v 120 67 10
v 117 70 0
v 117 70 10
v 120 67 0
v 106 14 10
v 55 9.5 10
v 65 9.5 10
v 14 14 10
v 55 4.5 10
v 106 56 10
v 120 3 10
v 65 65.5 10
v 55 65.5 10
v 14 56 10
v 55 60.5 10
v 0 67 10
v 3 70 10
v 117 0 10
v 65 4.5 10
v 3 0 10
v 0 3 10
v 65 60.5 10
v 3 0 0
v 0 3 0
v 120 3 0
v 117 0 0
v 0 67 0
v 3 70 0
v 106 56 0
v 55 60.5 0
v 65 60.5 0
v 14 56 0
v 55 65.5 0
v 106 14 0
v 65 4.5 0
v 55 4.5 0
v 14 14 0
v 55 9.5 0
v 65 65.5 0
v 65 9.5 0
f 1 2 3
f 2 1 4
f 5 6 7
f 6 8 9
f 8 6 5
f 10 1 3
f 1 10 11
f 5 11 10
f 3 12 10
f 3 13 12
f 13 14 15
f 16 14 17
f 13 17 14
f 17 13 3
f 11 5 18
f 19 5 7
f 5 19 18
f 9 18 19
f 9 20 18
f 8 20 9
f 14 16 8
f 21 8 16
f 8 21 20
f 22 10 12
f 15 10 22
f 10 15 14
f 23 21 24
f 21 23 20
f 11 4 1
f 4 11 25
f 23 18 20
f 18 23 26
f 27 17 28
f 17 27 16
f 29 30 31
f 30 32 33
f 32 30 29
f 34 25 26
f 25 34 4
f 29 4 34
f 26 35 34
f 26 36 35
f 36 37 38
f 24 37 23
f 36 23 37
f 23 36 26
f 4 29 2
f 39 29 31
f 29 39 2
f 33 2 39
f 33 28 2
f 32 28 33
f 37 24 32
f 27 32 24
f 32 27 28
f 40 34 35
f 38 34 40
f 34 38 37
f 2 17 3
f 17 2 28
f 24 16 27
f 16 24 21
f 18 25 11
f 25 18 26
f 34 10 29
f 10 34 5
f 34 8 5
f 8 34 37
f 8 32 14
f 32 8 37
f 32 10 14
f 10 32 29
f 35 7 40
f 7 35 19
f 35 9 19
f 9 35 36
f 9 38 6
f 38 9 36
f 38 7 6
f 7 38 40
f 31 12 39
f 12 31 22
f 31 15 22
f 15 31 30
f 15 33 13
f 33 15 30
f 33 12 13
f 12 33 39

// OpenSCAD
$fn = 32;

// ----------------------------------------------------------------------
// Frame plate: 120 x 70 frame, 14 mm rails
// ----------------------------------------------------------------------

// --- parameters (mm) ---
plate_l = 120;            // plate length, X
plate_w = 70;             // plate width, Y
plate_t = 10;             // plate thickness, Z (extrusion height)
corner_c = 3;             // corner chamfer
frame_bar = 14;           // frame rail width
slot_l = 10;              // adjustment slot length
slot_w = 5;               // adjustment slot width

win_l = plate_l - 2 * frame_bar;  // window length
win_w = plate_w - 2 * frame_bar;  // window width

profile = [[3, 0], [117, 0], [120, 3], [120, 67], [117, 70], [3, 70], [0, 67], [0, 3]];  // primary outline, 8 points, counter clockwise
void_1 = [[14, 14], [106, 14], [106, 56], [14, 56]];  // the window, 4 points
void_2 = [[55, 4.5], [65, 4.5], [65, 9.5], [55, 9.5]];  // adjustment slot, 4 points
void_3 = [[55, 60.5], [65, 60.5], [65, 65.5], [55, 65.5]];  // adjustment slot, 4 points

// --- the one profile operation ---
difference() {
  linear_extrude(height = plate_t) polygon(points = profile);
  translate([0, 0, -1])
    linear_extrude(height = plate_t + 2) polygon(points = void_1);
  translate([0, 0, -1])
    linear_extrude(height = plate_t + 2) polygon(points = void_2);
  translate([0, 0, -1])
    linear_extrude(height = plate_t + 2) polygon(points = void_3);
}
